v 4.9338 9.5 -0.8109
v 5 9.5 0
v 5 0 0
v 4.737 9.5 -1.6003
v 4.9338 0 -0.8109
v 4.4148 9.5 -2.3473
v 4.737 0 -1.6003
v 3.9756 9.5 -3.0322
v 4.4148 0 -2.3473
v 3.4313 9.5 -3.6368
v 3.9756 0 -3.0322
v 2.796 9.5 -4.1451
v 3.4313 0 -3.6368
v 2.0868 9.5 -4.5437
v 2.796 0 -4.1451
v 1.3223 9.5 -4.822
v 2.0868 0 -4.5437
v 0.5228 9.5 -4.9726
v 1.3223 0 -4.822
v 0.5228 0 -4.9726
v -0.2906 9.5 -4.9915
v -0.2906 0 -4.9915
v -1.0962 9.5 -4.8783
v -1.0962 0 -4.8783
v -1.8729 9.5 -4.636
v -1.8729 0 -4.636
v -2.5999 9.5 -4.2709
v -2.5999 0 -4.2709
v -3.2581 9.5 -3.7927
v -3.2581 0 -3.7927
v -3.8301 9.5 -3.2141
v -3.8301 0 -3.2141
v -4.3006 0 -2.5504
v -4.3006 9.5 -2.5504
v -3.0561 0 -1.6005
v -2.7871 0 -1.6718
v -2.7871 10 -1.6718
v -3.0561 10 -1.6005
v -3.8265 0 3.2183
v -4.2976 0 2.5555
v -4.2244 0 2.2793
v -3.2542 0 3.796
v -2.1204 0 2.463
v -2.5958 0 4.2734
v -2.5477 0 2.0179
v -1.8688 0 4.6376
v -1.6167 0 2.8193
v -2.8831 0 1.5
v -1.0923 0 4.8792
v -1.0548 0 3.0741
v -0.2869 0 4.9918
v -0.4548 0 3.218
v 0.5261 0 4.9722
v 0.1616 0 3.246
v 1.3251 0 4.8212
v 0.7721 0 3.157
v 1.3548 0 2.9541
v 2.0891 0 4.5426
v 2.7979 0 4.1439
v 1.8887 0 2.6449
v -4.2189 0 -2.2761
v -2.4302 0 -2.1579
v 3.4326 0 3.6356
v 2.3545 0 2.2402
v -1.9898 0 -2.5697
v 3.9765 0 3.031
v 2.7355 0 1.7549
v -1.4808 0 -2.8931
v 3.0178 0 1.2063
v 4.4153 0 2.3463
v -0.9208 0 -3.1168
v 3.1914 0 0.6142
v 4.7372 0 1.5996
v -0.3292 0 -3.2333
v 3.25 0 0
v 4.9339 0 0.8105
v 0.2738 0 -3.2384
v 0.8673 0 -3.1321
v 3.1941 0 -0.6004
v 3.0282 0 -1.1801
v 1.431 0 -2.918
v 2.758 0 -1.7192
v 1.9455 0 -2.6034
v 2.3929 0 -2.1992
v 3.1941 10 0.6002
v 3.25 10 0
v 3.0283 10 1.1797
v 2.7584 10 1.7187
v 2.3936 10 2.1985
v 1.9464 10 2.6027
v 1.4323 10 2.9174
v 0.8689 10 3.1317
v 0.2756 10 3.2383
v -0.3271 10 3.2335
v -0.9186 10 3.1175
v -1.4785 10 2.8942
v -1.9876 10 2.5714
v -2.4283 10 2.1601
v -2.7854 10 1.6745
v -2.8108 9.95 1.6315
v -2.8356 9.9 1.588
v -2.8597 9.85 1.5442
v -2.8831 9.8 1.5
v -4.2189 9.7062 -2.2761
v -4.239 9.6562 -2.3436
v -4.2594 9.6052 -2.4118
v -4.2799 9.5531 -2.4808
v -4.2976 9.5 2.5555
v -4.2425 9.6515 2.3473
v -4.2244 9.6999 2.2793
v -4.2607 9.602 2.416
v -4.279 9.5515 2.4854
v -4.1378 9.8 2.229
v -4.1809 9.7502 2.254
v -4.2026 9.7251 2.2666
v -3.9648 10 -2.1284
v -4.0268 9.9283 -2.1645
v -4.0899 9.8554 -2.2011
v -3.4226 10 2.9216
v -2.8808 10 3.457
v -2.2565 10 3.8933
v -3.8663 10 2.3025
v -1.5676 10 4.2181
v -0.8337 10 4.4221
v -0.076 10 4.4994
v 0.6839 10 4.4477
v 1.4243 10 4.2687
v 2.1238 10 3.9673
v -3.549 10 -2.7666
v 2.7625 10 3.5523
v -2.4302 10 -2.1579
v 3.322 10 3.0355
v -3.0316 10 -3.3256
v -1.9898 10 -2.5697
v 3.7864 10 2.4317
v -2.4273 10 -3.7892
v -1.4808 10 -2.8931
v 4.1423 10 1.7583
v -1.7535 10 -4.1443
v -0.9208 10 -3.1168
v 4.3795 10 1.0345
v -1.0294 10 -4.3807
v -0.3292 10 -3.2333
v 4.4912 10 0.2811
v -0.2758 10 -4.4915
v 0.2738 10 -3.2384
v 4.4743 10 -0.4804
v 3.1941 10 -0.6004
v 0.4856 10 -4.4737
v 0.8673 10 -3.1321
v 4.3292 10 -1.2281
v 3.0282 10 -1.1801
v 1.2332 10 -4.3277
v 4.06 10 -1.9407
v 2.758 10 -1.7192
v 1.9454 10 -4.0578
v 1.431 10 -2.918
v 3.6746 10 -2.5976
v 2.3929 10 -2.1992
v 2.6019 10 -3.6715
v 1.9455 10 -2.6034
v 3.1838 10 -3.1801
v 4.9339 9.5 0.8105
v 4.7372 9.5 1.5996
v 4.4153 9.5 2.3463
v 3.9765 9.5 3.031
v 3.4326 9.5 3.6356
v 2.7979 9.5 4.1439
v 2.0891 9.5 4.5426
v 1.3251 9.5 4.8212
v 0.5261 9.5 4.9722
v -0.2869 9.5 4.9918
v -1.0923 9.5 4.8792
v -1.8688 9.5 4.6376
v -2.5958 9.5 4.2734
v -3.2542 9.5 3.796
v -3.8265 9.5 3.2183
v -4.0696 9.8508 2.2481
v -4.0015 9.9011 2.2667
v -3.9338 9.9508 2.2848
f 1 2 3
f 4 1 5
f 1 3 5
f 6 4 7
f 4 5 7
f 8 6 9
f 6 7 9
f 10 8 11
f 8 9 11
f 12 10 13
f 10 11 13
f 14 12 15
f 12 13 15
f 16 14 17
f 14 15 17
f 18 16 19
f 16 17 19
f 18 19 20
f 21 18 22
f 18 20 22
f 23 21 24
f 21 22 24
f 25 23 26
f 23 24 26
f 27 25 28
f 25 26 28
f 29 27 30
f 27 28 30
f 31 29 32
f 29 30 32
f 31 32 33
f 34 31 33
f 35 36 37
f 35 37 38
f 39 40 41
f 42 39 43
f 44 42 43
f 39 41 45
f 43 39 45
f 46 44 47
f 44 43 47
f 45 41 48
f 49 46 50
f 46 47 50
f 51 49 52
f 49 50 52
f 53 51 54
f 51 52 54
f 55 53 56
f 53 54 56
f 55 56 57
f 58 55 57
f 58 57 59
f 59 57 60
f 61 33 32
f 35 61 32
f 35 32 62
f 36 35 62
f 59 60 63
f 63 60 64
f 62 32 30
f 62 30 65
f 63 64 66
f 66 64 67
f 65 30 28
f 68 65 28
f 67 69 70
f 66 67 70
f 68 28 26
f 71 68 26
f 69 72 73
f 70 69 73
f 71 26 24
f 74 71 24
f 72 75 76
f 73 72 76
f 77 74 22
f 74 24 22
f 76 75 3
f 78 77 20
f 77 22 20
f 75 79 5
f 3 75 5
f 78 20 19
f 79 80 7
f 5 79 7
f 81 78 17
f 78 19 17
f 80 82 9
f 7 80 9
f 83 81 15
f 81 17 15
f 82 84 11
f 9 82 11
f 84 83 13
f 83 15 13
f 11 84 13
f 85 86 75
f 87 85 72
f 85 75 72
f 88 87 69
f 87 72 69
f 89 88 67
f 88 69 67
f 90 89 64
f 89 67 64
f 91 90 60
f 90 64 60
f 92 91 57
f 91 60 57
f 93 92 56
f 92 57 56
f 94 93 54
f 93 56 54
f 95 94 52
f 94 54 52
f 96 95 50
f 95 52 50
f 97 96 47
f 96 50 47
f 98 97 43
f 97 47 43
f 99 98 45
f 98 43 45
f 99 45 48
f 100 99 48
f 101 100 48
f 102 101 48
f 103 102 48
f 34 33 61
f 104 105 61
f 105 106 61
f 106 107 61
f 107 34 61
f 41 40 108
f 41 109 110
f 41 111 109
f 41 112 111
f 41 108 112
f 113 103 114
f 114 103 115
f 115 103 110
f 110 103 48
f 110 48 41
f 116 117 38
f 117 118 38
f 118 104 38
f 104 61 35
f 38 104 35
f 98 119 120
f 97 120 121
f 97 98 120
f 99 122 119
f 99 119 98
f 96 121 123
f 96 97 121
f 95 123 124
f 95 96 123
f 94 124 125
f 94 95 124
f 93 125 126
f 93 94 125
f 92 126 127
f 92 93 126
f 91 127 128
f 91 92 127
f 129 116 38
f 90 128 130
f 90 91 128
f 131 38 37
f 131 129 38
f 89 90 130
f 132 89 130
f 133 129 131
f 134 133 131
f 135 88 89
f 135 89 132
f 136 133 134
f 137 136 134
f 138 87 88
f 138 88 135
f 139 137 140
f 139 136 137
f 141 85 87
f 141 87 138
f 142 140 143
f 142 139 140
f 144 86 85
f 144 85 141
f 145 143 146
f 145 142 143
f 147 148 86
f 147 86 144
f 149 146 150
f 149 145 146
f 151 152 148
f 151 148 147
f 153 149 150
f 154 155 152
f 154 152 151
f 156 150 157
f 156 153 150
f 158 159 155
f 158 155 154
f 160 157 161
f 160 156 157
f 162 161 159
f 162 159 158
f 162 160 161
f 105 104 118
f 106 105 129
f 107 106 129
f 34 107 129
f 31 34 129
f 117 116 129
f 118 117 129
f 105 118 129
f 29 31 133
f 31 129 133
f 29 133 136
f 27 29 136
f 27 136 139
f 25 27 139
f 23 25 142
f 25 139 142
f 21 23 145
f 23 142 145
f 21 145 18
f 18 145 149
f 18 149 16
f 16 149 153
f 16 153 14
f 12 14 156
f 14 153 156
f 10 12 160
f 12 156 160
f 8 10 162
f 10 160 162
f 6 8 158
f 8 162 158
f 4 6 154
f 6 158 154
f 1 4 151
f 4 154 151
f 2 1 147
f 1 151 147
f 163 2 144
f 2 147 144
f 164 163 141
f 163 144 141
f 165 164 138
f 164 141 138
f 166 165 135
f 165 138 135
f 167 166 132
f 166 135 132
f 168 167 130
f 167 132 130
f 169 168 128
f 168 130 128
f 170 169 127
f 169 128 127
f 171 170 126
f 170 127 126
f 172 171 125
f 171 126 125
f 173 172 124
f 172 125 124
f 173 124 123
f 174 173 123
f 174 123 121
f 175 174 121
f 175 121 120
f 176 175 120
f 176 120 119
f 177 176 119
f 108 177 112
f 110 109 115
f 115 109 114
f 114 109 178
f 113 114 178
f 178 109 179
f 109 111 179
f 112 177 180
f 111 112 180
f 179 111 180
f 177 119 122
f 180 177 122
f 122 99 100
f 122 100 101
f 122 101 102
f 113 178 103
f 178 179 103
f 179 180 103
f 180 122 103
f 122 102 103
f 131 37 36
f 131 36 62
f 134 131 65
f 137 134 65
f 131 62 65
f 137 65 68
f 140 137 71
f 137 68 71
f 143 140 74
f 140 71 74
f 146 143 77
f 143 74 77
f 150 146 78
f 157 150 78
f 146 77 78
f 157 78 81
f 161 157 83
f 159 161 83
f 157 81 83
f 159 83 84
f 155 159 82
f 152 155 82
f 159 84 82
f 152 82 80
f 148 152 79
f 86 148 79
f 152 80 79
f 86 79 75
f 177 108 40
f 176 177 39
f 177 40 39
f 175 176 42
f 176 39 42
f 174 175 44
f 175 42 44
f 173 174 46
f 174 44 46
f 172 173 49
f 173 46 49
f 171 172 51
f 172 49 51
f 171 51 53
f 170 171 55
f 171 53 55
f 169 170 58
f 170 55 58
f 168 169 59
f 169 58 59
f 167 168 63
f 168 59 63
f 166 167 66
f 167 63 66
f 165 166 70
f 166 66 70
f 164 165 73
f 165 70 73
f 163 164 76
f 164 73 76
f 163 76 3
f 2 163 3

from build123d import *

# Parameters (mm, degrees)
BOSS_EXTRUDE1_DEPTH = 10
CHAMFER1_SIZE       = 0.2
CHAMFER1_SIZE_2     = 0.206341937
CHAMFER2_SIZE       = 0.5


with BuildPart() as part:
    # Sketch1 → Boss-Extrude1 (new body)
    with BuildSketch(Plane(origin=(0, 0, 0), x_dir=(1, 0, 0), z_dir=(0, 1, 0))):
        with BuildLine():
            ThreePointArc((5, 0), (1.227434059, 4.846999652), (-4.397362252, 2.379748983))
            Line((-4.397362252, 2.379748983), (-2.883140649, 1.5))
            ThreePointArc((-2.883140649, 1.5), (0.772105204, 3.156953207), (3.25, 0))
            ThreePointArc((3.25, 0), (0.772105204, -3.156953207), (-2.883140649, -1.5))
            Line((-2.883140649, -1.5), (-4.397362252, -2.379748983))
            ThreePointArc((-4.397362252, -2.379748983), (1.227434059, -4.846999652), (5, 0))
        make_face()
    extrude(amount=BOSS_EXTRUDE1_DEPTH)

    # Chamfer1
    # the kernel refuses this chamfer: 0.206341937, 0.2, 0.191297121 mm, written as the material it takes off along each edge
    with BuildSketch(Plane(origin=(-2.883140649, -0.514336598, -1.5), x_dir=(0.4881882615859918, 0, -0.8727383463843256), z_dir=(0, 1, 0))) as chamfer1_piece_1:
        with BuildLine():
            Line((0.196815803, 0), (CHAMFER1_SIZE * 0.0163116056584, CHAMFER1_SIZE * 0.99986695691))
            Line((CHAMFER1_SIZE * 0.0163116056584, CHAMFER1_SIZE * 0.99986695691), (0, 0))
            ThreePointArc((0, 0), (0.101193556, 0.001489012), (0.196815803, 0))
        make_face()
    extrude(amount=11.028673195, mode=Mode.SUBTRACT)
    with BuildSketch(Plane(origin=(-4.397362252, -0.531068819, -2.379748983), x_dir=(0.4931124519861111, 0, -0.8699655796042999), z_dir=(0, 1, 0))) as chamfer1_piece_2:
        with BuildLine():
            Line((0.196188757, 0), (-CHAMFER1_SIZE_2 * 0.010660935079, -CHAMFER1_SIZE_2 * 0.999943172174))
            Line((-CHAMFER1_SIZE_2 * 0.010660935079, -CHAMFER1_SIZE_2 * 0.999943172174), (0, 0))
            ThreePointArc((0, 0), (0.100953531, 0.000961526), (0.196188757, 0))
        make_face()
    extrude(amount=11.062137639, mode=Mode.SUBTRACT)
    with BuildSketch(Plane(origin=(-4.397362252, -0.520052168, 2.379748983), x_dir=(0.49362201920020077, 0, 0.8696765503109283), z_dir=(0, 1, 0))) as chamfer1_piece_3:
        with BuildLine():
            Line((0.202045895, 0), (-CHAMFER1_SIZE * 0.0100751366451, CHAMFER1_SIZE * 0.999949244523))
            Line((-CHAMFER1_SIZE * 0.0100751366451, CHAMFER1_SIZE * 0.999949244523), (0, 0))
            ThreePointArc((0, 0), (0.103969214, -0.0010198), (0.202045895, 0))
        make_face()
    extrude(amount=11.040104337, mode=Mode.SUBTRACT)
    # the kernel refuses this chamfer: 0.206341937, 0.2, 0.191297121 mm, written as the material it takes off along each edge
    with BuildSketch(Plane(origin=(-2.438414829, 10, 1.241618342), x_dir=(0.502359075260422, 0, 0.8646591001680913), z_dir=(-0.8646591001680916, 0, 0.5023590752604221))) as chamfer1_2_piece_1:
        Polygon((CHAMFER1_SIZE, 0), (0, -CHAMFER1_SIZE), (0, 0), align=None)
    extrude(amount=2.57990857, mode=Mode.SUBTRACT)

    # Chamfer2
    # the kernel refuses this chamfer: 0.5 mm, written as the material it takes off along each edge
    with BuildSketch(Plane(origin=(0, 10, 0), x_dir=(-0.9618869269385497, 0, -0.2734475082803154), z_dir=(-0.2734475082803154, 0, 0.9618869269385497))) as chamfer2_piece_1:
        Polygon((5, CHAMFER2_SIZE), (5 - CHAMFER2_SIZE, 0), (5, 0), align=None)
    revolve(axis=Axis((0, 10, 0), (0, -1, 0)), revolution_arc=328.193834559, mode=Mode.SUBTRACT)


solid = part.part
